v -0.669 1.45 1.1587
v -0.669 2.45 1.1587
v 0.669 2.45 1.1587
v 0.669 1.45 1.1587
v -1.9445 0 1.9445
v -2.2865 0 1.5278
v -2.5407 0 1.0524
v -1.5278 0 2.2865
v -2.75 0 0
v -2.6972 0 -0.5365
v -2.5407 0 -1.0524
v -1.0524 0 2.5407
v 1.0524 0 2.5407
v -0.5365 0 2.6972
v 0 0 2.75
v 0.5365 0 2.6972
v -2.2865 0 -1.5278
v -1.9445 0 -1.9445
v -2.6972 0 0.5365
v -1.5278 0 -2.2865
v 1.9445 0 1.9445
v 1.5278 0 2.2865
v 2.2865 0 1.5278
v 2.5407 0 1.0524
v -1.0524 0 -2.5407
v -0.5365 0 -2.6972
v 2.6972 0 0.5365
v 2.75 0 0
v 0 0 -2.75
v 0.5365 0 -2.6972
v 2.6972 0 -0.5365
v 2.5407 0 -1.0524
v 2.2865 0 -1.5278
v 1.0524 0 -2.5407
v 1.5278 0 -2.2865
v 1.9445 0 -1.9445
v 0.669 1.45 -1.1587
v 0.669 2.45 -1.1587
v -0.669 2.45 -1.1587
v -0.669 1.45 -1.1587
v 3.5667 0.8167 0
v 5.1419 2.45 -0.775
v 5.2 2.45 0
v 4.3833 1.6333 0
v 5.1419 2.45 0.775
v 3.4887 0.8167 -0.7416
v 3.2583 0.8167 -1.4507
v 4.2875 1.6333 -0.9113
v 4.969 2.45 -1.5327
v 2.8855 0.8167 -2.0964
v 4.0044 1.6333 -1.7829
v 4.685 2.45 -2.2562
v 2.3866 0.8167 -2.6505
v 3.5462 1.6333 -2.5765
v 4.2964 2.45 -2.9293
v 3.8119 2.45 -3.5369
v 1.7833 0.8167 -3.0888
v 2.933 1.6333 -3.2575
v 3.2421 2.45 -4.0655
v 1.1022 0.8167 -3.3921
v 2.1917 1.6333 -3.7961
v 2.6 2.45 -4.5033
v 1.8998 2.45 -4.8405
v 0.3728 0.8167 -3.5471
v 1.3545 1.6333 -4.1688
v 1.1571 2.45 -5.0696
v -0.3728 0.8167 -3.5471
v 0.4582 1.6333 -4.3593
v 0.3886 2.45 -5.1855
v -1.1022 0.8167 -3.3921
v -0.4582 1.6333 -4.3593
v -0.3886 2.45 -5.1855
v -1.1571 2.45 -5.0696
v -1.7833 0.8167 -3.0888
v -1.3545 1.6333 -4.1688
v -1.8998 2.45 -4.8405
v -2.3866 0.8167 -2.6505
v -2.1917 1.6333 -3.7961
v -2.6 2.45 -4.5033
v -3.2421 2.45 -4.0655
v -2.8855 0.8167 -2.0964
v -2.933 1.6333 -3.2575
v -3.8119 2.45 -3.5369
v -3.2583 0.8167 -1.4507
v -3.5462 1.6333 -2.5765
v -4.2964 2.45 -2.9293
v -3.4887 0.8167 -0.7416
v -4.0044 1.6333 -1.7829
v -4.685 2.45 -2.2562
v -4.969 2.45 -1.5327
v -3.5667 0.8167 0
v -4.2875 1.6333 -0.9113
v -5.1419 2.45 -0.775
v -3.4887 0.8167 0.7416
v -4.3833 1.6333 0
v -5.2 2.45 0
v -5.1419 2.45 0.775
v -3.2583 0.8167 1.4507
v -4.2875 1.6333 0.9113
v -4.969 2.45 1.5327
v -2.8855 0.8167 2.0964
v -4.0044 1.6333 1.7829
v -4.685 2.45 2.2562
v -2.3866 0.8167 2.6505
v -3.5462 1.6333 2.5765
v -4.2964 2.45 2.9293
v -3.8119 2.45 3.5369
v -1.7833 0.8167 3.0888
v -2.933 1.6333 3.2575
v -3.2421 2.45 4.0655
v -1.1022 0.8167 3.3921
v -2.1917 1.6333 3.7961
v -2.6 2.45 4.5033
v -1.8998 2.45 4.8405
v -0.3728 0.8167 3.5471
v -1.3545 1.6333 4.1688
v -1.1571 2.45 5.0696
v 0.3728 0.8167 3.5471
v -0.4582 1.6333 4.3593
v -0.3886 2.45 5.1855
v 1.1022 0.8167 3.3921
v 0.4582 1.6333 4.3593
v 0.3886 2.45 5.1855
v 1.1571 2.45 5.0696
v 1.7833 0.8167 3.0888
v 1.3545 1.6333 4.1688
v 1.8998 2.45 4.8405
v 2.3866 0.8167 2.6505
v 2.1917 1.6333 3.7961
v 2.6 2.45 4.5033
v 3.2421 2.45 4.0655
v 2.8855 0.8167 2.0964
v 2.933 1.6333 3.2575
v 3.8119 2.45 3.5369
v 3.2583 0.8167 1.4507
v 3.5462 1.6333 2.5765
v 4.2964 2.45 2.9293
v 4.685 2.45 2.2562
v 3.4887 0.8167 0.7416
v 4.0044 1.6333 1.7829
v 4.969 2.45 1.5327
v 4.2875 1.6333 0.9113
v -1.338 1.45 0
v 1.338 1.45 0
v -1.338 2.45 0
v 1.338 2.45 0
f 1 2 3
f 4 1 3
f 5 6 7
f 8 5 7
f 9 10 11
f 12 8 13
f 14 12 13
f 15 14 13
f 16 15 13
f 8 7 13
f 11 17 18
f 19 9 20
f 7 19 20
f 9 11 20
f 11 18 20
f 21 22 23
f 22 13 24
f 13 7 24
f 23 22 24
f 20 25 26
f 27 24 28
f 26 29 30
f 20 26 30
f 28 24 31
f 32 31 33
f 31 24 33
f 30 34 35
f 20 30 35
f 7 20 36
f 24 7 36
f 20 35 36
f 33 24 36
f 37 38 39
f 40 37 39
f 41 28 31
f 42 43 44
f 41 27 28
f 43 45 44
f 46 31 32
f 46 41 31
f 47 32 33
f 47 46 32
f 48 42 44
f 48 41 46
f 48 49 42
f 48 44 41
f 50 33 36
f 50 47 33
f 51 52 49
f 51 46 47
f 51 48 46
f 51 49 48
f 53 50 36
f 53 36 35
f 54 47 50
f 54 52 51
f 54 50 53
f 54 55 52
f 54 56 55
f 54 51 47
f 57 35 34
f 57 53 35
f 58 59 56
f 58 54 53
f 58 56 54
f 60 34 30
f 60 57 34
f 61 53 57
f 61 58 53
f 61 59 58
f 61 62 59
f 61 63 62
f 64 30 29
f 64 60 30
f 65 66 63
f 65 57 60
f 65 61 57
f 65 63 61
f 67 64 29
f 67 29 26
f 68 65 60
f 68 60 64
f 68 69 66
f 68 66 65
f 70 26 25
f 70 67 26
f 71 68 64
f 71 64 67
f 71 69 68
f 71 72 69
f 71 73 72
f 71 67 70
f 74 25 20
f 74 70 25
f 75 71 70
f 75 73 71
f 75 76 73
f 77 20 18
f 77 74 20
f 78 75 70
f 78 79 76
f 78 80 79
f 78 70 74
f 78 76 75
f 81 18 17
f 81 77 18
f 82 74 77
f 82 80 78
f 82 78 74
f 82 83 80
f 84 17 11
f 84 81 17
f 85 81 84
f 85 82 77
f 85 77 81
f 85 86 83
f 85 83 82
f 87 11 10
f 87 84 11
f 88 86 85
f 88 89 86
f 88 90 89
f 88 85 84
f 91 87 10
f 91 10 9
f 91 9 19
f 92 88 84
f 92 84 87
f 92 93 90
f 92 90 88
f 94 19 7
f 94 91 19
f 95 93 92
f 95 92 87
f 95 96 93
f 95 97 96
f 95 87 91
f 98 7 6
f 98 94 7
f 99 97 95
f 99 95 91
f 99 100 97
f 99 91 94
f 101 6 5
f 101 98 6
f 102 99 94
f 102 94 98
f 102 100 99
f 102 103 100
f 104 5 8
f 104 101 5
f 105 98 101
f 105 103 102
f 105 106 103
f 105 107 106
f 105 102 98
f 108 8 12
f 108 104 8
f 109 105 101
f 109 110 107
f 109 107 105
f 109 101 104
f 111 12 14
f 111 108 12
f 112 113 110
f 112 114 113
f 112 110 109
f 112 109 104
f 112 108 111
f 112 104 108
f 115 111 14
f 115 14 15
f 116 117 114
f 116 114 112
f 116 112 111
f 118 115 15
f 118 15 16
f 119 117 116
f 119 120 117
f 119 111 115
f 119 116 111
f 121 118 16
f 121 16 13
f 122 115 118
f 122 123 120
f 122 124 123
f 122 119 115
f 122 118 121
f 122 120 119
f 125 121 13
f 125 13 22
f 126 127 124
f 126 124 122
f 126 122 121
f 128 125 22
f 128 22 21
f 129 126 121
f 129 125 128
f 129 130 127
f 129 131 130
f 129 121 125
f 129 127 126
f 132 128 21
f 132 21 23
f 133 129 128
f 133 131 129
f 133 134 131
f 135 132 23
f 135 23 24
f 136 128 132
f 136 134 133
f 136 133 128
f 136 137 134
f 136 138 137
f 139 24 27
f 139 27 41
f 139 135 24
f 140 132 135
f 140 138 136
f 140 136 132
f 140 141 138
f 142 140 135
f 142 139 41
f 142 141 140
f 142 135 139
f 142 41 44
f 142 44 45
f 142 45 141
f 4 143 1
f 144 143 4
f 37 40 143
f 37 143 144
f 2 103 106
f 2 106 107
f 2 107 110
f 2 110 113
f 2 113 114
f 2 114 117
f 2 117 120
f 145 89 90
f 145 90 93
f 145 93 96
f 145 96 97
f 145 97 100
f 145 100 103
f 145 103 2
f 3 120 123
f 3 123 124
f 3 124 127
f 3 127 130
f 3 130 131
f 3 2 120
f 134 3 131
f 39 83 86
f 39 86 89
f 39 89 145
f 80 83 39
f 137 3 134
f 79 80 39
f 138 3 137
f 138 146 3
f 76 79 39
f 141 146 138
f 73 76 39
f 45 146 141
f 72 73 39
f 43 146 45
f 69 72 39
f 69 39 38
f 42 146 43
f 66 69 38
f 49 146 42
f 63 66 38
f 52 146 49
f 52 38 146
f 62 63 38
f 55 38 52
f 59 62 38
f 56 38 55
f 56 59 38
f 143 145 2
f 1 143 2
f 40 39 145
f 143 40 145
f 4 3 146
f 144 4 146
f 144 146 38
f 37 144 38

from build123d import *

# Parameters (mm, degrees)
SKETCH5_R          = 2.75
SKETCH4_R          = 5.2
CUT_EXTRUDE1_DEPTH = 1


with BuildPart() as part:
    # Sketch5 → Loft1 section 0
    with BuildSketch(Plane(origin=(0, 0, 0), x_dir=(1, 0, 0), z_dir=(0, 1, 0))):
        Circle(SKETCH5_R)
    # Sketch4 → Loft1 section 1
    with BuildSketch(Plane(origin=(0, 2.45, 0), x_dir=(1, 0, 0), z_dir=(0, 1, 0))):
        Circle(SKETCH4_R)
    loft()

    # Sketch6 → Cut-Extrude1 (cut)
    with BuildSketch(Plane(origin=(0, 2.45, 0), x_dir=(1, 0, 0), z_dir=(0, 1, 0))):
        Polygon((1.337999459, 0), (0.66899973, 1.158741522), (-0.66899973, 1.158741522), (-1.337999459, 0), (-0.66899973, -1.158741522), (0.66899973, -1.158741522), align=None)
    extrude(amount=-CUT_EXTRUDE1_DEPTH, mode=Mode.SUBTRACT)


solid = part.part
